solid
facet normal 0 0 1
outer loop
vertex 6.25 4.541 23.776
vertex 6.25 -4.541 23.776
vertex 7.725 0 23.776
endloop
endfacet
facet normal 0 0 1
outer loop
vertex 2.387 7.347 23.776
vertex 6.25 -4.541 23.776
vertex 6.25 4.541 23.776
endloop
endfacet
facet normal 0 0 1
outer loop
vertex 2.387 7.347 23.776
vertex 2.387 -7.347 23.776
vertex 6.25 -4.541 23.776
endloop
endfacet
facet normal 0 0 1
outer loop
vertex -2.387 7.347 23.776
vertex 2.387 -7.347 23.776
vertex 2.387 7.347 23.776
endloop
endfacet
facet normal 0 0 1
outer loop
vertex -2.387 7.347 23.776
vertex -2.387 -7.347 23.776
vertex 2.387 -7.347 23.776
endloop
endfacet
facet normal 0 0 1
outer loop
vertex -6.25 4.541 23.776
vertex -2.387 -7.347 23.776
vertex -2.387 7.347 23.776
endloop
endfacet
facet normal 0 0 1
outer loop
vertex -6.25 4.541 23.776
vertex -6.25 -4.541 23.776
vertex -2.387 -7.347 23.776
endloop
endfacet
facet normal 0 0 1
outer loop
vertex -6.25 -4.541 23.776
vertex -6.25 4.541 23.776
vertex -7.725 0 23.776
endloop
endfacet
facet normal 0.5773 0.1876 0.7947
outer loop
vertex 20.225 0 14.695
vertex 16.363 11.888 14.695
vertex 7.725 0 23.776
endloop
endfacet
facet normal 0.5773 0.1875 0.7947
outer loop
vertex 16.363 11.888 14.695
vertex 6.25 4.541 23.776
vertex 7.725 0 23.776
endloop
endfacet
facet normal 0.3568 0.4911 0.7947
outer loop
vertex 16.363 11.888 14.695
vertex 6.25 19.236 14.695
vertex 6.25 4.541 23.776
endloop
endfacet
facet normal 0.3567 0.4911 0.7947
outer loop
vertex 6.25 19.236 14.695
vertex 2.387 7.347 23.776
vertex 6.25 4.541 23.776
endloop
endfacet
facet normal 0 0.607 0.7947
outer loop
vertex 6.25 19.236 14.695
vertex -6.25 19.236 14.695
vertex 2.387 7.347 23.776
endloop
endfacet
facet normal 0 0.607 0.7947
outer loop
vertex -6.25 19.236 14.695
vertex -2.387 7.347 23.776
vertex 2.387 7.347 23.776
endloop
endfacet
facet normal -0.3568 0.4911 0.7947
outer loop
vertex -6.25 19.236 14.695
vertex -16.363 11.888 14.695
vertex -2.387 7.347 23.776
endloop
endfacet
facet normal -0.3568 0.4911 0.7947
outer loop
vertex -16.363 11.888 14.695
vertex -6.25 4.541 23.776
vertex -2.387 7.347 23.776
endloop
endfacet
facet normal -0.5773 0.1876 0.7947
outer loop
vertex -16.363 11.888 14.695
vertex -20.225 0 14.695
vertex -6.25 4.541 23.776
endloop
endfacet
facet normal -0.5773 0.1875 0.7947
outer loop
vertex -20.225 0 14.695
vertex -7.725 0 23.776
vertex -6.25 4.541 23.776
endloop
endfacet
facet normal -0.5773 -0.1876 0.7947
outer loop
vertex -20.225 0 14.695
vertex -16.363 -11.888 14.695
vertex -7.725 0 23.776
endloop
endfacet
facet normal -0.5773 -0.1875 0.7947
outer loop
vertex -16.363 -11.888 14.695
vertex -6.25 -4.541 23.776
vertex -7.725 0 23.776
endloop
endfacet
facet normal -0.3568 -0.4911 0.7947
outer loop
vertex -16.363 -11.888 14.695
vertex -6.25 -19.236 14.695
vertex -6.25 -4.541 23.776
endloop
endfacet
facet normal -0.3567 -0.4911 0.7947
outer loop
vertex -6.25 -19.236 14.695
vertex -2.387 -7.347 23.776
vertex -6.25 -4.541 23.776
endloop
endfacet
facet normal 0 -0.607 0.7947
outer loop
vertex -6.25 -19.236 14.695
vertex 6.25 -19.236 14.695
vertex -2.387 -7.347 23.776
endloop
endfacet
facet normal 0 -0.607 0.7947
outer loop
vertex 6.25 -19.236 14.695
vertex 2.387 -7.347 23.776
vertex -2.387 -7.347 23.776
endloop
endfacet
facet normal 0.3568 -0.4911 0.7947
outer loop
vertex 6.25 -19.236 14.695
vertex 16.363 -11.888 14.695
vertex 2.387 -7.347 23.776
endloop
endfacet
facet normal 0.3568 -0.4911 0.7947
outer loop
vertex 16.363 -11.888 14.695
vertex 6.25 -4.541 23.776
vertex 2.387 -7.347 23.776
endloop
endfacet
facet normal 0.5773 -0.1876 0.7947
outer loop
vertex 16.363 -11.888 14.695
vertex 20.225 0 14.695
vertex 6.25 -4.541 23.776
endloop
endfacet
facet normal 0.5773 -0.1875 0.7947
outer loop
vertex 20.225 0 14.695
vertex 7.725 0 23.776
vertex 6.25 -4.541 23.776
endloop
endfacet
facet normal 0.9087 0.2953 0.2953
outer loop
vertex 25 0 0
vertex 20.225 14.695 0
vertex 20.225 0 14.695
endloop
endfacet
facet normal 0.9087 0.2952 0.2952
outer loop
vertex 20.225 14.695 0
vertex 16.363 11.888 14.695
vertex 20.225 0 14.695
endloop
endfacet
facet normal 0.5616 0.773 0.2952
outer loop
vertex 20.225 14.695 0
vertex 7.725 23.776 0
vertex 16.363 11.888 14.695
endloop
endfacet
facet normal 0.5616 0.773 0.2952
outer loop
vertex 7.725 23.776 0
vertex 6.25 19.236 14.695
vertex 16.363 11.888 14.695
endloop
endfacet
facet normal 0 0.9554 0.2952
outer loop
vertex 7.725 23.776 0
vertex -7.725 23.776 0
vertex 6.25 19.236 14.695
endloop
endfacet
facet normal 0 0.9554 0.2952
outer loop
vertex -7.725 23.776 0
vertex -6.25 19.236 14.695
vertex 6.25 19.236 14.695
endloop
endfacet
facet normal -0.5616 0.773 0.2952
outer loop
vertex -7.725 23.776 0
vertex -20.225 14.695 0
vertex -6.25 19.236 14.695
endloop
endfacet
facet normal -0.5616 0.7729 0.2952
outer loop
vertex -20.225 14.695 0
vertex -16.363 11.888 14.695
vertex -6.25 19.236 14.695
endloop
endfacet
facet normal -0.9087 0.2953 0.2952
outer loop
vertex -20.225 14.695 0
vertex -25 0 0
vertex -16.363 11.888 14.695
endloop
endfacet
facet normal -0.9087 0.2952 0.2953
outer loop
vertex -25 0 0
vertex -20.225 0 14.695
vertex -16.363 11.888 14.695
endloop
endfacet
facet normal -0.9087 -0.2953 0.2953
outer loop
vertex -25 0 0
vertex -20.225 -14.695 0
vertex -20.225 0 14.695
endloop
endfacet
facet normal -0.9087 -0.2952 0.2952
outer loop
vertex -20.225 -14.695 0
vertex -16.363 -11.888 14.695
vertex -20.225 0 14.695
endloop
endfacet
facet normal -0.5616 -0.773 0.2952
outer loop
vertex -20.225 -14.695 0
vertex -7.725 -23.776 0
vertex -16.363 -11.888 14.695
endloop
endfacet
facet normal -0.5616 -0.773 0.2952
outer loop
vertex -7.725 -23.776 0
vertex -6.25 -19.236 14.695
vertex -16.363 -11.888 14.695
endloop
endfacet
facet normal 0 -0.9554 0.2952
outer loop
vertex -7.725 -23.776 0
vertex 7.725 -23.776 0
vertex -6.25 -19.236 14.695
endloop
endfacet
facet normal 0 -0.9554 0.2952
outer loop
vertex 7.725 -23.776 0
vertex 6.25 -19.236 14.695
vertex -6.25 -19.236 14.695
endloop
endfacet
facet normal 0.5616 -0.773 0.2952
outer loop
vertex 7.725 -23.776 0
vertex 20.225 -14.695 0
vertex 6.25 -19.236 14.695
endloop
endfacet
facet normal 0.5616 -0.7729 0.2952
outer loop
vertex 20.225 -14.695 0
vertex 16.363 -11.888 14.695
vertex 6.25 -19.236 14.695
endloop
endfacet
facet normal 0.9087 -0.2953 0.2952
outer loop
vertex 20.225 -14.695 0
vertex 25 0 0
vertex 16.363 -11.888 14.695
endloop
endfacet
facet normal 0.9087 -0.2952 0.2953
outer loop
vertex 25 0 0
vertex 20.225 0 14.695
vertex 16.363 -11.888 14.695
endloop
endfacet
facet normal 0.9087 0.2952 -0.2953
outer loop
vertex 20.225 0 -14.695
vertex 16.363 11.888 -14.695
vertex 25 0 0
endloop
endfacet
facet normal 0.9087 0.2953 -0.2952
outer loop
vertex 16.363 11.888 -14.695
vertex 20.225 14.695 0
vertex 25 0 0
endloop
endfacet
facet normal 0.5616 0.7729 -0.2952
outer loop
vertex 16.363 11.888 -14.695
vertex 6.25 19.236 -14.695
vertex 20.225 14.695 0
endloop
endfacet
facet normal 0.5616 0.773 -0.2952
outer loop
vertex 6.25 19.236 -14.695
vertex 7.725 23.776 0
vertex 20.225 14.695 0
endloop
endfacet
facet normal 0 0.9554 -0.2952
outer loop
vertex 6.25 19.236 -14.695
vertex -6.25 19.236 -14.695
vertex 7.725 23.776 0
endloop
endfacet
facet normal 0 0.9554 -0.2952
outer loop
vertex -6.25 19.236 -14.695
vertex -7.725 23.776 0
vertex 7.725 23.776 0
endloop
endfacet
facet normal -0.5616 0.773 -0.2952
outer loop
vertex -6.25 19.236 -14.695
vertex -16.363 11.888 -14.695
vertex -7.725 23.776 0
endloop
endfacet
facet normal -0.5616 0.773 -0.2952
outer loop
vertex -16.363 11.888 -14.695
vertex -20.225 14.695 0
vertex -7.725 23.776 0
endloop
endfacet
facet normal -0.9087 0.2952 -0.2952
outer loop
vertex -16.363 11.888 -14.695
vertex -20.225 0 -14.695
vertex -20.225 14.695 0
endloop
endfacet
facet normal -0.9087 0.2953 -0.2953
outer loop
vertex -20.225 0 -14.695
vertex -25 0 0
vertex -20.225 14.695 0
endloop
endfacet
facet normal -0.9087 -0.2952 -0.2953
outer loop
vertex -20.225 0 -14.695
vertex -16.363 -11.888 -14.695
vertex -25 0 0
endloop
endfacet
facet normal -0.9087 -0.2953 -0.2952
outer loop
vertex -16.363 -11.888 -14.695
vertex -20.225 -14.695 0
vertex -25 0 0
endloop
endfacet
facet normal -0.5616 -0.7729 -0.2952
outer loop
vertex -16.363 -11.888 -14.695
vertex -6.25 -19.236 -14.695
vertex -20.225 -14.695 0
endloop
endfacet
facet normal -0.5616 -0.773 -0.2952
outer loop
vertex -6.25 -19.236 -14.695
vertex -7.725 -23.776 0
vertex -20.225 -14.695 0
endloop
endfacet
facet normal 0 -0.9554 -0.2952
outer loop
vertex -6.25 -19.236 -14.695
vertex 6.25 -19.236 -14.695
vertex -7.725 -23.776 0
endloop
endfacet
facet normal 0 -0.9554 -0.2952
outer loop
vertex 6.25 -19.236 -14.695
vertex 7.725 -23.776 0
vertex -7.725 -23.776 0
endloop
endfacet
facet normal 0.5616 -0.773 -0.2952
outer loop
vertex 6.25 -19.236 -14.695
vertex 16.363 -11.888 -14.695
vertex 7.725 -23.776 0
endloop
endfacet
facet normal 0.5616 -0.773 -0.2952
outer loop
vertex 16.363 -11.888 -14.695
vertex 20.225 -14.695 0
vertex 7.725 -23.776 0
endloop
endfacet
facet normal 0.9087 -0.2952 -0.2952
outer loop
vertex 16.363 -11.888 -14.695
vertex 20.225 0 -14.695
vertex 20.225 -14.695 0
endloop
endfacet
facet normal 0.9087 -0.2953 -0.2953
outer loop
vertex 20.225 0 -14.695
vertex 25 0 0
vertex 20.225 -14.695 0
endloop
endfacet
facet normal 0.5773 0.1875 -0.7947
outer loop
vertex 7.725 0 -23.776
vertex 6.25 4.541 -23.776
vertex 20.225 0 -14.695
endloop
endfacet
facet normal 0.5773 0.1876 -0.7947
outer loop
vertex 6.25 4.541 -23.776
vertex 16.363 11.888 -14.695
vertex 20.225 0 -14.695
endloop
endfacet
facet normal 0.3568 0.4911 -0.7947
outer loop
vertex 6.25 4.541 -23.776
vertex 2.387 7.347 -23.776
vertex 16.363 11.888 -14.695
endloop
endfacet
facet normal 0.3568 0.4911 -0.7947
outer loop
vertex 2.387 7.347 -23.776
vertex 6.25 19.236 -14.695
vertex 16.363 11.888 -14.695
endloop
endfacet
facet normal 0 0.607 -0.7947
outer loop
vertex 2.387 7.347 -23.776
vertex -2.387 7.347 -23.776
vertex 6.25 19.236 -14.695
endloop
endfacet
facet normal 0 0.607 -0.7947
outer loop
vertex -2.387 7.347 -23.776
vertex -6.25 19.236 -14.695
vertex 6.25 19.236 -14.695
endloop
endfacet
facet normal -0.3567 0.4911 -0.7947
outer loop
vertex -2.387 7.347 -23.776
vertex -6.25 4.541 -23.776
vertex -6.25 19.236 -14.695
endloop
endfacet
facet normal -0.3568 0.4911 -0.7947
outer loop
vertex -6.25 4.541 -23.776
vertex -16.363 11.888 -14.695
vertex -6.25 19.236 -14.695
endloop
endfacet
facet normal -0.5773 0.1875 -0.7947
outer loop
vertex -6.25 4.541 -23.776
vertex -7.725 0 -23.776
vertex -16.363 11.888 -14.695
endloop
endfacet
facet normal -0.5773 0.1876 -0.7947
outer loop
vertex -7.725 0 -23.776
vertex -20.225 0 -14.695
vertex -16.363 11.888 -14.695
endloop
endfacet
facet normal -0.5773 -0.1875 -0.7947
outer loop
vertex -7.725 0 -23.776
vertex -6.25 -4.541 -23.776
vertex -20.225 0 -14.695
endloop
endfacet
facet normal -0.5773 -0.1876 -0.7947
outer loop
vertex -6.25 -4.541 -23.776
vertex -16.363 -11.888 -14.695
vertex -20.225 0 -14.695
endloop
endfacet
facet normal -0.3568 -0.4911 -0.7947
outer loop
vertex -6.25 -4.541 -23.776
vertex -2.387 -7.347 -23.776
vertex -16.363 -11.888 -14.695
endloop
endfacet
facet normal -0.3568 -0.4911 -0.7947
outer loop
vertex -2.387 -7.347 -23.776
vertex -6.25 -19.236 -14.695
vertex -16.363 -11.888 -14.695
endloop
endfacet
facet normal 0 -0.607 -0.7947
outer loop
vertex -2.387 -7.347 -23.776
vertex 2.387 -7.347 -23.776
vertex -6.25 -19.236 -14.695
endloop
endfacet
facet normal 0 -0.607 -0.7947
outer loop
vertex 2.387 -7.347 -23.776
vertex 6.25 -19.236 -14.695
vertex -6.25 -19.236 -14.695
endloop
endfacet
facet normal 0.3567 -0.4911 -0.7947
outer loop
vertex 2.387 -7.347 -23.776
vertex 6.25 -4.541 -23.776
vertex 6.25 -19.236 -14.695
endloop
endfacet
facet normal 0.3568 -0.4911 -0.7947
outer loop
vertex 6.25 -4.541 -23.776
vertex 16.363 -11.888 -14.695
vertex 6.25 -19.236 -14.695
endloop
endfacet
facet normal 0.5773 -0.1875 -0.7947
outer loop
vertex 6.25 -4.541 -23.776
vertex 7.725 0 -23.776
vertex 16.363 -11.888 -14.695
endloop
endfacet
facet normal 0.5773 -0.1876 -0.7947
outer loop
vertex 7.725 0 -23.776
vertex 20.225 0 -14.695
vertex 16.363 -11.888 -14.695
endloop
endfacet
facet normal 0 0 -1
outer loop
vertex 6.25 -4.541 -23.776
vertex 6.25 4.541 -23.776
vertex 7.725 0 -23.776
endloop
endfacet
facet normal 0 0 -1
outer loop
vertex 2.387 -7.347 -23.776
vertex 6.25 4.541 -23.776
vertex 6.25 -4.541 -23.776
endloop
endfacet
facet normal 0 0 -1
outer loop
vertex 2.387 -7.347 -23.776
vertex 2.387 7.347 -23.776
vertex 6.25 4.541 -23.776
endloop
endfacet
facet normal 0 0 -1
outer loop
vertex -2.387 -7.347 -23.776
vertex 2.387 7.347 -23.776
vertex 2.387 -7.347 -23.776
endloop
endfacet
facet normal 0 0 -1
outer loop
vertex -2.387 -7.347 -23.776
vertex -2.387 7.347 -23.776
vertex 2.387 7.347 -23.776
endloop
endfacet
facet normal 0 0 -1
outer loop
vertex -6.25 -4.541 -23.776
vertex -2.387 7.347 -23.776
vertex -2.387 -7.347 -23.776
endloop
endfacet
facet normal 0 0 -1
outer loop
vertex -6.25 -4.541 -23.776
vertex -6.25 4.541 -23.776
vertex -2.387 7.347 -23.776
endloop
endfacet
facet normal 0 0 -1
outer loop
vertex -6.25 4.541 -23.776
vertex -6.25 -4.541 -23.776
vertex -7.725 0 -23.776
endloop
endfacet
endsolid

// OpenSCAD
first_layer_height = 0.24;
layer_height = 0.08;

edge = 50;

sphere(
    d = edge,
    $fn = 10);
